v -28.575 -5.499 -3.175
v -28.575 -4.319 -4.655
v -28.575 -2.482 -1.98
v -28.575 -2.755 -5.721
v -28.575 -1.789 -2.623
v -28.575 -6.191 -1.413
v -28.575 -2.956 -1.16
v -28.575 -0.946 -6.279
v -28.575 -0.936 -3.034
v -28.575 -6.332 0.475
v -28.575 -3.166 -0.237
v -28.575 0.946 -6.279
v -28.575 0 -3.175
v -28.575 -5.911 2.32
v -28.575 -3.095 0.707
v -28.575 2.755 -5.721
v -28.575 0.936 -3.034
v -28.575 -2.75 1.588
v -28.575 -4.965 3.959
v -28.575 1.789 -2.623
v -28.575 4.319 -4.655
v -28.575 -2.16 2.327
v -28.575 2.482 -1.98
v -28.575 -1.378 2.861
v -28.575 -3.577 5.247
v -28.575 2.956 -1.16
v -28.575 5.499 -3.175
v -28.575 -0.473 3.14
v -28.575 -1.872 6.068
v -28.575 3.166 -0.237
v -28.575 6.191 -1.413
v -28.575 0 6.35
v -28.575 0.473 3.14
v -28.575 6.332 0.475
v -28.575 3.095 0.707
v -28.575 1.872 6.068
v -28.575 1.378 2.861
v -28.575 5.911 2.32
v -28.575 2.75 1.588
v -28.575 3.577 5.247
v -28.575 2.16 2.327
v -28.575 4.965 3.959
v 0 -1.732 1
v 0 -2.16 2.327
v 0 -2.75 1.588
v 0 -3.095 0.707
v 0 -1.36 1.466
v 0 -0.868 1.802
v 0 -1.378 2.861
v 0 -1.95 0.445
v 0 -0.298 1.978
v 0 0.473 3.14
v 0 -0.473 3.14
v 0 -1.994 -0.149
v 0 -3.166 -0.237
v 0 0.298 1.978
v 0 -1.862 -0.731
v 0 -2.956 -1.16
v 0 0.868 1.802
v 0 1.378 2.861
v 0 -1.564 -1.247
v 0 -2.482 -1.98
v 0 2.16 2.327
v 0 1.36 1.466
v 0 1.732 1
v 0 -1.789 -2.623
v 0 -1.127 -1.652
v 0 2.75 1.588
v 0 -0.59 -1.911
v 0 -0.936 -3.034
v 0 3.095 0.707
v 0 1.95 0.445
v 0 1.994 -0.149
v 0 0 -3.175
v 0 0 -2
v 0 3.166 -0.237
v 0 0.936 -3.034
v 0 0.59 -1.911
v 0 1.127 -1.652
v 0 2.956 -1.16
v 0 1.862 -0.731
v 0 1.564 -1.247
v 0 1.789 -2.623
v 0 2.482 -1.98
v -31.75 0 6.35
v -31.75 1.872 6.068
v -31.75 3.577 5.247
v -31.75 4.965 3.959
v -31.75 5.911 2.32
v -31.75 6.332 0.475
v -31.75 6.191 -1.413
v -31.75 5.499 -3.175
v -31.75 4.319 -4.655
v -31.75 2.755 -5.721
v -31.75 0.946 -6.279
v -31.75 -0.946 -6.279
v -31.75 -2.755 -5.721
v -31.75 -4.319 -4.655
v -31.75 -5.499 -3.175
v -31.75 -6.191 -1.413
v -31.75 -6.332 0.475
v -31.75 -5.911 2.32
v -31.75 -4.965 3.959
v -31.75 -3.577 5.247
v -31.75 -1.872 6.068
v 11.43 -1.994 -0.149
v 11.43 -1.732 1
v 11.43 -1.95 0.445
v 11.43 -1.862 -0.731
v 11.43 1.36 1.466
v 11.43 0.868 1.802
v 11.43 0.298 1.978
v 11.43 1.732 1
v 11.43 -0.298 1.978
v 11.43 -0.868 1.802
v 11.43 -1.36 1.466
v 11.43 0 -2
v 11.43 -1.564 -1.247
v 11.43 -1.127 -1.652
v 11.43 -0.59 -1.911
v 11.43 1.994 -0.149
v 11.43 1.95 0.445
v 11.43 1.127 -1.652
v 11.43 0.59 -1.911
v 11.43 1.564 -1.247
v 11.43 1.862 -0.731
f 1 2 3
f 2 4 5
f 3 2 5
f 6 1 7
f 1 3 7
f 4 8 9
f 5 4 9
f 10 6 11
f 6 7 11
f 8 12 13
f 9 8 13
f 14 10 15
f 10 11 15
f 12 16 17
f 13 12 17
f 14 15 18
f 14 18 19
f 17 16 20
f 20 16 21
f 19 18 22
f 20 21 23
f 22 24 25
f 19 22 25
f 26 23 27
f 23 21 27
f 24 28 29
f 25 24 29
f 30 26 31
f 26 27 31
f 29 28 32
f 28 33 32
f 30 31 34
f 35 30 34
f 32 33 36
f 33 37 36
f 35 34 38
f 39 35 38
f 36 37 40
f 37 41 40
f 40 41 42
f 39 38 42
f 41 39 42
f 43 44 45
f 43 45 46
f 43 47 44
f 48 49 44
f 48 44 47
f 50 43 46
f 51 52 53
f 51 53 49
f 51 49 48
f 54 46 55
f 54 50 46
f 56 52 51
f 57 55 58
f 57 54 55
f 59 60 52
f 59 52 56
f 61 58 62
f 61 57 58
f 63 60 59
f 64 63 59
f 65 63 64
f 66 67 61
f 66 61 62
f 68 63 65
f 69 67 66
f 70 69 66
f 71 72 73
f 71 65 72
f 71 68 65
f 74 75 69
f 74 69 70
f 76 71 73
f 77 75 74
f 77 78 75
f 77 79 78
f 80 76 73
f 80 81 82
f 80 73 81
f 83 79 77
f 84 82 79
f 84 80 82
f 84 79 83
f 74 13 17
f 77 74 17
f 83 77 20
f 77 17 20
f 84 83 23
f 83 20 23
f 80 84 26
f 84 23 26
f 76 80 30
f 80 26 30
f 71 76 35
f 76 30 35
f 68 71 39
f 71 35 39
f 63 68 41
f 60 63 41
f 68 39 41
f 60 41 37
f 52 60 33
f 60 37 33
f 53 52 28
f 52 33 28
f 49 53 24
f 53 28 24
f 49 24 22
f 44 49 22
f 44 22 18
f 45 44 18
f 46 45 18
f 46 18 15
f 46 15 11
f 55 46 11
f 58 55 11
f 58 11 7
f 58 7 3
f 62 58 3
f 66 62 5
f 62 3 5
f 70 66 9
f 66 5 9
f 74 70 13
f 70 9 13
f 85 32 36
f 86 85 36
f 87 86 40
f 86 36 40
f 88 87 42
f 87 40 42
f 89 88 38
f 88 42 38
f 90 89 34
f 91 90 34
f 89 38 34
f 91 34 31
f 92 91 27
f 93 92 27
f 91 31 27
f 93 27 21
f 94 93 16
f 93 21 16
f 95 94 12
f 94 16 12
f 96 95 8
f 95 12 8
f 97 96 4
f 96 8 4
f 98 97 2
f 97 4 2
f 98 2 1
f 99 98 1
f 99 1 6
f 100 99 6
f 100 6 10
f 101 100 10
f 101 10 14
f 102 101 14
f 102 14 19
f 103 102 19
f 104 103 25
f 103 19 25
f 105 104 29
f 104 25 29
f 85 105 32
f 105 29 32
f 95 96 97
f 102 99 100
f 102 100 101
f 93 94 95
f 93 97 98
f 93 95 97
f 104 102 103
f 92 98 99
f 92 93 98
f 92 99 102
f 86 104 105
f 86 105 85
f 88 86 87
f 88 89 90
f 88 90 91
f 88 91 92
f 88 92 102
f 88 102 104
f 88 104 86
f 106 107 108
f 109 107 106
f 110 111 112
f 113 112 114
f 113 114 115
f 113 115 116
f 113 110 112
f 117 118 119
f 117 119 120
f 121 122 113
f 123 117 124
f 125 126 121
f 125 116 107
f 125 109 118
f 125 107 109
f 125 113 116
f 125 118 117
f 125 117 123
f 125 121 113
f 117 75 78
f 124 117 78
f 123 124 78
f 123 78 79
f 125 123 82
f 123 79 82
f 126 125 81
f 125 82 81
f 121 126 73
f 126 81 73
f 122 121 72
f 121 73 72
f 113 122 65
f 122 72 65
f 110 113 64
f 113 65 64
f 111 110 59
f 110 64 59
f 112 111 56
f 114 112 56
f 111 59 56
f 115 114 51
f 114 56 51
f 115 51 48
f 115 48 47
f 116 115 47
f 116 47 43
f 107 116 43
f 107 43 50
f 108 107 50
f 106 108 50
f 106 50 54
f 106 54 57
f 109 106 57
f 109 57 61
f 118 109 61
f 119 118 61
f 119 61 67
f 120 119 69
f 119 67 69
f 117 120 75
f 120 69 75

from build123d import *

# Parameters (mm, degrees)
SKETCH1_R           = 2
BOSS_EXTRUDE1_DEPTH = 11.43
SKETCH1_3_R         = 3.175
BOSS_EXTRUDE2_DEPTH = 28.575
SKETCH2_R           = 6.35
BOSS_EXTRUDE3_DEPTH = 3.175


with BuildPart() as part:
    # Sketch1 → Boss-Extrude1 (new body)
    with BuildSketch(Plane(origin=(0, 0, 0), x_dir=(0, 0, -1), z_dir=(1, 0, 0))):
        Circle(SKETCH1_R)
    extrude(amount=BOSS_EXTRUDE1_DEPTH)

    # Sketch1<3> → Boss-Extrude2 (add)
    with BuildSketch(Plane(origin=(0, 0, 0), x_dir=(0, 0, -1), z_dir=(1, 0, 0))):
        Circle(SKETCH1_3_R)
    extrude(amount=-BOSS_EXTRUDE2_DEPTH)

    # Sketch2 → Boss-Extrude3 (add)
    with BuildSketch(Plane.ZY.offset(28.575)):
        Circle(SKETCH2_R)
    extrude(amount=BOSS_EXTRUDE3_DEPTH)


solid = part.part
